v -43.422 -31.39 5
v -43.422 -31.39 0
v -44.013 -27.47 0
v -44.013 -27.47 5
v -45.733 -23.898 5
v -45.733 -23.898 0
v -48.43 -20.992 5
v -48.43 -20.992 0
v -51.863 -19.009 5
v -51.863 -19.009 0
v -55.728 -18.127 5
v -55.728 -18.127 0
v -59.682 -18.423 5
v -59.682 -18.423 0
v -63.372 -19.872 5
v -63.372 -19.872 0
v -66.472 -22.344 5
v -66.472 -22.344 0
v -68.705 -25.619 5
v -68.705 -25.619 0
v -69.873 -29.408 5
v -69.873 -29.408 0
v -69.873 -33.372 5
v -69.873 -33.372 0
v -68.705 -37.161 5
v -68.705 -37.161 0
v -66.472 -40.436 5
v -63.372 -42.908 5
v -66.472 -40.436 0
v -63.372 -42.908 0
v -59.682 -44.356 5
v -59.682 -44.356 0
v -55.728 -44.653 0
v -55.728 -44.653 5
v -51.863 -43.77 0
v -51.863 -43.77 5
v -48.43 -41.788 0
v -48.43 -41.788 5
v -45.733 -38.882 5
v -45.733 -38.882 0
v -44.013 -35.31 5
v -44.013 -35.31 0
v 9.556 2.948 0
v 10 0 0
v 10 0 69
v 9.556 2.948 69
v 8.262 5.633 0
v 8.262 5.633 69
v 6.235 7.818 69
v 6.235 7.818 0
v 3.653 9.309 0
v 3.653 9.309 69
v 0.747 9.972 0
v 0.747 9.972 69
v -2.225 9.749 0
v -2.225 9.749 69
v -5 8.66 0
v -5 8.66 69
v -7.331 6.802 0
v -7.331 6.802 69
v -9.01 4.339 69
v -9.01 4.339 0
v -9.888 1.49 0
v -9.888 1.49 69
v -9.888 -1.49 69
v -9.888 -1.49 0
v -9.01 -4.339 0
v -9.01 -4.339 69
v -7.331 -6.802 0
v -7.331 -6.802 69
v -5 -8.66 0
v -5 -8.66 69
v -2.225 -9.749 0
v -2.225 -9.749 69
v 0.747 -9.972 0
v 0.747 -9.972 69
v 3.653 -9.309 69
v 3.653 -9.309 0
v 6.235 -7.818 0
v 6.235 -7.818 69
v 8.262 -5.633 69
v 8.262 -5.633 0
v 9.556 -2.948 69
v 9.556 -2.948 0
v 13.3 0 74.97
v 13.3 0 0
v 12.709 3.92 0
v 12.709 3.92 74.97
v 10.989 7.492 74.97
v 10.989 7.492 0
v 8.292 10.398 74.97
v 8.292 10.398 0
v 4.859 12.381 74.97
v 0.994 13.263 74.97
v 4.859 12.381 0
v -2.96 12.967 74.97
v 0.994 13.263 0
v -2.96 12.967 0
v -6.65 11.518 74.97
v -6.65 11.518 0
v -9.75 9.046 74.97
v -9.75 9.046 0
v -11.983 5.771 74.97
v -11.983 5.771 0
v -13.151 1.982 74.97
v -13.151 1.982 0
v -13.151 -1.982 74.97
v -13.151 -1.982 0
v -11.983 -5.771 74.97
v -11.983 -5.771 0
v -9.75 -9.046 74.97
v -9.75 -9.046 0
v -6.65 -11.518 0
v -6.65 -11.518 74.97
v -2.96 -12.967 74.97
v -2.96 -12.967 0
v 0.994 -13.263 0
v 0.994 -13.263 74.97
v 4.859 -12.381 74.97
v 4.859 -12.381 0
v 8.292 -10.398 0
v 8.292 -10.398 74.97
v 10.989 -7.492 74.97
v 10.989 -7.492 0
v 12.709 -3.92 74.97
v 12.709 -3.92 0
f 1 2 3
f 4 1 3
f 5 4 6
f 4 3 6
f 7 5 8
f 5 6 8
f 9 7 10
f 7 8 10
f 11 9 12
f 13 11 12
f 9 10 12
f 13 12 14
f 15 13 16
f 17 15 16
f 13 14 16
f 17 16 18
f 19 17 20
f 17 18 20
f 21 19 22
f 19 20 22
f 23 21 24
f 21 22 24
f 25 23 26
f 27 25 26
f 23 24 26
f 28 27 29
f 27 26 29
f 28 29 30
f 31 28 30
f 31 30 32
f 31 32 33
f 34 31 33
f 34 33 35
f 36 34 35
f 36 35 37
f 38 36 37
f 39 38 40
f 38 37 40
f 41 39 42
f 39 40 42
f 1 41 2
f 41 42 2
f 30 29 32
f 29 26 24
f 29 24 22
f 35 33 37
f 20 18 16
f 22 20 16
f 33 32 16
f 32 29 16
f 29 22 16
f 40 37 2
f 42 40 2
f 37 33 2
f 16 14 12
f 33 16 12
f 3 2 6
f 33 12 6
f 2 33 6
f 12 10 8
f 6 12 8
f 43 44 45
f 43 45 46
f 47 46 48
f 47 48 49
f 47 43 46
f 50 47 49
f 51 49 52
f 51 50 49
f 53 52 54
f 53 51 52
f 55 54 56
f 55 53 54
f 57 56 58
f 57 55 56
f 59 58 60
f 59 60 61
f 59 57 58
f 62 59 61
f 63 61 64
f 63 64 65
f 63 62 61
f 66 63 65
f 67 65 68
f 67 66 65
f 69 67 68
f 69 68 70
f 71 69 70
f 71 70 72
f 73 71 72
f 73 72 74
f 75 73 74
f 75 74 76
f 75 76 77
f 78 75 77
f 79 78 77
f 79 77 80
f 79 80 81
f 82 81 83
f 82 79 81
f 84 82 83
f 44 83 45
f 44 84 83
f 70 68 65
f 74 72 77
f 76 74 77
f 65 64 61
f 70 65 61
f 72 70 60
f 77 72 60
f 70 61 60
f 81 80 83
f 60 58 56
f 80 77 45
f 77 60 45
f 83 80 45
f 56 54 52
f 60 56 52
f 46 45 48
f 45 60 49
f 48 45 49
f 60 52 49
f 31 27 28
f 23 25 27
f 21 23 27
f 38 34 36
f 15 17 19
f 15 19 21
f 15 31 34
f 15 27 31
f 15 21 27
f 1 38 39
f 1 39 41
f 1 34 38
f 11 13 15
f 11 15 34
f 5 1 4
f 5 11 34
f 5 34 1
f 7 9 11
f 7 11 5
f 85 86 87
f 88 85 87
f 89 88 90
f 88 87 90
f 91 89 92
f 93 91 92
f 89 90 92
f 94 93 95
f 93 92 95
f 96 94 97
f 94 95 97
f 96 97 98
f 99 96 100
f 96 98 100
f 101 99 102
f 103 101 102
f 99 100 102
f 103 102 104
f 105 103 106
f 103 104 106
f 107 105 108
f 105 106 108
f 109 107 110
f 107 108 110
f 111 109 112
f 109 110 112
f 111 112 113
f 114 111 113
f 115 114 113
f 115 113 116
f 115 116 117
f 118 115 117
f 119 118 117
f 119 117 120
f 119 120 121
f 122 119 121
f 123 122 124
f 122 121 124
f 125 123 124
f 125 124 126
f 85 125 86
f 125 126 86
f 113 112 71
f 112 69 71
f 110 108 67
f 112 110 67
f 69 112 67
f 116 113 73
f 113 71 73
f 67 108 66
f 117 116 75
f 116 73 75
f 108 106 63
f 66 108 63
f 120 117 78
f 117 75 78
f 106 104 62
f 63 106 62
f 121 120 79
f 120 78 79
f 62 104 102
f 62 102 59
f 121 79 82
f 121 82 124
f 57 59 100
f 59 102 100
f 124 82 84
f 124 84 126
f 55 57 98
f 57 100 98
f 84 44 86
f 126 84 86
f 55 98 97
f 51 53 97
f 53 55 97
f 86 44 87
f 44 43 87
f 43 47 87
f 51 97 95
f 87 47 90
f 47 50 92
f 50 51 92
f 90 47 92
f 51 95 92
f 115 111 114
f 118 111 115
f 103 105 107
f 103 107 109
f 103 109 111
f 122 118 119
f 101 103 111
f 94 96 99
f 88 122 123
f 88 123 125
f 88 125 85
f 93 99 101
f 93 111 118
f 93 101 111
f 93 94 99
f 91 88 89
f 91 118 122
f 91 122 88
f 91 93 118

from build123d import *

# Parameters (mm, degrees)
F0_R     = 13.3
F1_DEPTH = 74.97
F2_R     = 10
F3_DEPTH = 69
F4_R     = 13.3
F5_DEPTH = 5


with BuildPart() as f1:
    # F0 (on Top) → F1 (new body)
    with BuildSketch(Plane.XY):
        Circle(F0_R)
    extrude(amount=F1_DEPTH)

    # F2 (on Top) → F3 (cut)
    with BuildSketch(Plane.XY):
        Circle(F2_R)
    extrude(amount=F3_DEPTH, mode=Mode.SUBTRACT)


with BuildPart() as f5:
    # F4 (on Top) → F5 (new body)
    with BuildSketch(Plane.XY):
        with Locations((-56.72203, -31.389862)):
            Circle(F4_R)
    extrude(amount=F5_DEPTH)


solid = Compound([f1.part, f5.part])
